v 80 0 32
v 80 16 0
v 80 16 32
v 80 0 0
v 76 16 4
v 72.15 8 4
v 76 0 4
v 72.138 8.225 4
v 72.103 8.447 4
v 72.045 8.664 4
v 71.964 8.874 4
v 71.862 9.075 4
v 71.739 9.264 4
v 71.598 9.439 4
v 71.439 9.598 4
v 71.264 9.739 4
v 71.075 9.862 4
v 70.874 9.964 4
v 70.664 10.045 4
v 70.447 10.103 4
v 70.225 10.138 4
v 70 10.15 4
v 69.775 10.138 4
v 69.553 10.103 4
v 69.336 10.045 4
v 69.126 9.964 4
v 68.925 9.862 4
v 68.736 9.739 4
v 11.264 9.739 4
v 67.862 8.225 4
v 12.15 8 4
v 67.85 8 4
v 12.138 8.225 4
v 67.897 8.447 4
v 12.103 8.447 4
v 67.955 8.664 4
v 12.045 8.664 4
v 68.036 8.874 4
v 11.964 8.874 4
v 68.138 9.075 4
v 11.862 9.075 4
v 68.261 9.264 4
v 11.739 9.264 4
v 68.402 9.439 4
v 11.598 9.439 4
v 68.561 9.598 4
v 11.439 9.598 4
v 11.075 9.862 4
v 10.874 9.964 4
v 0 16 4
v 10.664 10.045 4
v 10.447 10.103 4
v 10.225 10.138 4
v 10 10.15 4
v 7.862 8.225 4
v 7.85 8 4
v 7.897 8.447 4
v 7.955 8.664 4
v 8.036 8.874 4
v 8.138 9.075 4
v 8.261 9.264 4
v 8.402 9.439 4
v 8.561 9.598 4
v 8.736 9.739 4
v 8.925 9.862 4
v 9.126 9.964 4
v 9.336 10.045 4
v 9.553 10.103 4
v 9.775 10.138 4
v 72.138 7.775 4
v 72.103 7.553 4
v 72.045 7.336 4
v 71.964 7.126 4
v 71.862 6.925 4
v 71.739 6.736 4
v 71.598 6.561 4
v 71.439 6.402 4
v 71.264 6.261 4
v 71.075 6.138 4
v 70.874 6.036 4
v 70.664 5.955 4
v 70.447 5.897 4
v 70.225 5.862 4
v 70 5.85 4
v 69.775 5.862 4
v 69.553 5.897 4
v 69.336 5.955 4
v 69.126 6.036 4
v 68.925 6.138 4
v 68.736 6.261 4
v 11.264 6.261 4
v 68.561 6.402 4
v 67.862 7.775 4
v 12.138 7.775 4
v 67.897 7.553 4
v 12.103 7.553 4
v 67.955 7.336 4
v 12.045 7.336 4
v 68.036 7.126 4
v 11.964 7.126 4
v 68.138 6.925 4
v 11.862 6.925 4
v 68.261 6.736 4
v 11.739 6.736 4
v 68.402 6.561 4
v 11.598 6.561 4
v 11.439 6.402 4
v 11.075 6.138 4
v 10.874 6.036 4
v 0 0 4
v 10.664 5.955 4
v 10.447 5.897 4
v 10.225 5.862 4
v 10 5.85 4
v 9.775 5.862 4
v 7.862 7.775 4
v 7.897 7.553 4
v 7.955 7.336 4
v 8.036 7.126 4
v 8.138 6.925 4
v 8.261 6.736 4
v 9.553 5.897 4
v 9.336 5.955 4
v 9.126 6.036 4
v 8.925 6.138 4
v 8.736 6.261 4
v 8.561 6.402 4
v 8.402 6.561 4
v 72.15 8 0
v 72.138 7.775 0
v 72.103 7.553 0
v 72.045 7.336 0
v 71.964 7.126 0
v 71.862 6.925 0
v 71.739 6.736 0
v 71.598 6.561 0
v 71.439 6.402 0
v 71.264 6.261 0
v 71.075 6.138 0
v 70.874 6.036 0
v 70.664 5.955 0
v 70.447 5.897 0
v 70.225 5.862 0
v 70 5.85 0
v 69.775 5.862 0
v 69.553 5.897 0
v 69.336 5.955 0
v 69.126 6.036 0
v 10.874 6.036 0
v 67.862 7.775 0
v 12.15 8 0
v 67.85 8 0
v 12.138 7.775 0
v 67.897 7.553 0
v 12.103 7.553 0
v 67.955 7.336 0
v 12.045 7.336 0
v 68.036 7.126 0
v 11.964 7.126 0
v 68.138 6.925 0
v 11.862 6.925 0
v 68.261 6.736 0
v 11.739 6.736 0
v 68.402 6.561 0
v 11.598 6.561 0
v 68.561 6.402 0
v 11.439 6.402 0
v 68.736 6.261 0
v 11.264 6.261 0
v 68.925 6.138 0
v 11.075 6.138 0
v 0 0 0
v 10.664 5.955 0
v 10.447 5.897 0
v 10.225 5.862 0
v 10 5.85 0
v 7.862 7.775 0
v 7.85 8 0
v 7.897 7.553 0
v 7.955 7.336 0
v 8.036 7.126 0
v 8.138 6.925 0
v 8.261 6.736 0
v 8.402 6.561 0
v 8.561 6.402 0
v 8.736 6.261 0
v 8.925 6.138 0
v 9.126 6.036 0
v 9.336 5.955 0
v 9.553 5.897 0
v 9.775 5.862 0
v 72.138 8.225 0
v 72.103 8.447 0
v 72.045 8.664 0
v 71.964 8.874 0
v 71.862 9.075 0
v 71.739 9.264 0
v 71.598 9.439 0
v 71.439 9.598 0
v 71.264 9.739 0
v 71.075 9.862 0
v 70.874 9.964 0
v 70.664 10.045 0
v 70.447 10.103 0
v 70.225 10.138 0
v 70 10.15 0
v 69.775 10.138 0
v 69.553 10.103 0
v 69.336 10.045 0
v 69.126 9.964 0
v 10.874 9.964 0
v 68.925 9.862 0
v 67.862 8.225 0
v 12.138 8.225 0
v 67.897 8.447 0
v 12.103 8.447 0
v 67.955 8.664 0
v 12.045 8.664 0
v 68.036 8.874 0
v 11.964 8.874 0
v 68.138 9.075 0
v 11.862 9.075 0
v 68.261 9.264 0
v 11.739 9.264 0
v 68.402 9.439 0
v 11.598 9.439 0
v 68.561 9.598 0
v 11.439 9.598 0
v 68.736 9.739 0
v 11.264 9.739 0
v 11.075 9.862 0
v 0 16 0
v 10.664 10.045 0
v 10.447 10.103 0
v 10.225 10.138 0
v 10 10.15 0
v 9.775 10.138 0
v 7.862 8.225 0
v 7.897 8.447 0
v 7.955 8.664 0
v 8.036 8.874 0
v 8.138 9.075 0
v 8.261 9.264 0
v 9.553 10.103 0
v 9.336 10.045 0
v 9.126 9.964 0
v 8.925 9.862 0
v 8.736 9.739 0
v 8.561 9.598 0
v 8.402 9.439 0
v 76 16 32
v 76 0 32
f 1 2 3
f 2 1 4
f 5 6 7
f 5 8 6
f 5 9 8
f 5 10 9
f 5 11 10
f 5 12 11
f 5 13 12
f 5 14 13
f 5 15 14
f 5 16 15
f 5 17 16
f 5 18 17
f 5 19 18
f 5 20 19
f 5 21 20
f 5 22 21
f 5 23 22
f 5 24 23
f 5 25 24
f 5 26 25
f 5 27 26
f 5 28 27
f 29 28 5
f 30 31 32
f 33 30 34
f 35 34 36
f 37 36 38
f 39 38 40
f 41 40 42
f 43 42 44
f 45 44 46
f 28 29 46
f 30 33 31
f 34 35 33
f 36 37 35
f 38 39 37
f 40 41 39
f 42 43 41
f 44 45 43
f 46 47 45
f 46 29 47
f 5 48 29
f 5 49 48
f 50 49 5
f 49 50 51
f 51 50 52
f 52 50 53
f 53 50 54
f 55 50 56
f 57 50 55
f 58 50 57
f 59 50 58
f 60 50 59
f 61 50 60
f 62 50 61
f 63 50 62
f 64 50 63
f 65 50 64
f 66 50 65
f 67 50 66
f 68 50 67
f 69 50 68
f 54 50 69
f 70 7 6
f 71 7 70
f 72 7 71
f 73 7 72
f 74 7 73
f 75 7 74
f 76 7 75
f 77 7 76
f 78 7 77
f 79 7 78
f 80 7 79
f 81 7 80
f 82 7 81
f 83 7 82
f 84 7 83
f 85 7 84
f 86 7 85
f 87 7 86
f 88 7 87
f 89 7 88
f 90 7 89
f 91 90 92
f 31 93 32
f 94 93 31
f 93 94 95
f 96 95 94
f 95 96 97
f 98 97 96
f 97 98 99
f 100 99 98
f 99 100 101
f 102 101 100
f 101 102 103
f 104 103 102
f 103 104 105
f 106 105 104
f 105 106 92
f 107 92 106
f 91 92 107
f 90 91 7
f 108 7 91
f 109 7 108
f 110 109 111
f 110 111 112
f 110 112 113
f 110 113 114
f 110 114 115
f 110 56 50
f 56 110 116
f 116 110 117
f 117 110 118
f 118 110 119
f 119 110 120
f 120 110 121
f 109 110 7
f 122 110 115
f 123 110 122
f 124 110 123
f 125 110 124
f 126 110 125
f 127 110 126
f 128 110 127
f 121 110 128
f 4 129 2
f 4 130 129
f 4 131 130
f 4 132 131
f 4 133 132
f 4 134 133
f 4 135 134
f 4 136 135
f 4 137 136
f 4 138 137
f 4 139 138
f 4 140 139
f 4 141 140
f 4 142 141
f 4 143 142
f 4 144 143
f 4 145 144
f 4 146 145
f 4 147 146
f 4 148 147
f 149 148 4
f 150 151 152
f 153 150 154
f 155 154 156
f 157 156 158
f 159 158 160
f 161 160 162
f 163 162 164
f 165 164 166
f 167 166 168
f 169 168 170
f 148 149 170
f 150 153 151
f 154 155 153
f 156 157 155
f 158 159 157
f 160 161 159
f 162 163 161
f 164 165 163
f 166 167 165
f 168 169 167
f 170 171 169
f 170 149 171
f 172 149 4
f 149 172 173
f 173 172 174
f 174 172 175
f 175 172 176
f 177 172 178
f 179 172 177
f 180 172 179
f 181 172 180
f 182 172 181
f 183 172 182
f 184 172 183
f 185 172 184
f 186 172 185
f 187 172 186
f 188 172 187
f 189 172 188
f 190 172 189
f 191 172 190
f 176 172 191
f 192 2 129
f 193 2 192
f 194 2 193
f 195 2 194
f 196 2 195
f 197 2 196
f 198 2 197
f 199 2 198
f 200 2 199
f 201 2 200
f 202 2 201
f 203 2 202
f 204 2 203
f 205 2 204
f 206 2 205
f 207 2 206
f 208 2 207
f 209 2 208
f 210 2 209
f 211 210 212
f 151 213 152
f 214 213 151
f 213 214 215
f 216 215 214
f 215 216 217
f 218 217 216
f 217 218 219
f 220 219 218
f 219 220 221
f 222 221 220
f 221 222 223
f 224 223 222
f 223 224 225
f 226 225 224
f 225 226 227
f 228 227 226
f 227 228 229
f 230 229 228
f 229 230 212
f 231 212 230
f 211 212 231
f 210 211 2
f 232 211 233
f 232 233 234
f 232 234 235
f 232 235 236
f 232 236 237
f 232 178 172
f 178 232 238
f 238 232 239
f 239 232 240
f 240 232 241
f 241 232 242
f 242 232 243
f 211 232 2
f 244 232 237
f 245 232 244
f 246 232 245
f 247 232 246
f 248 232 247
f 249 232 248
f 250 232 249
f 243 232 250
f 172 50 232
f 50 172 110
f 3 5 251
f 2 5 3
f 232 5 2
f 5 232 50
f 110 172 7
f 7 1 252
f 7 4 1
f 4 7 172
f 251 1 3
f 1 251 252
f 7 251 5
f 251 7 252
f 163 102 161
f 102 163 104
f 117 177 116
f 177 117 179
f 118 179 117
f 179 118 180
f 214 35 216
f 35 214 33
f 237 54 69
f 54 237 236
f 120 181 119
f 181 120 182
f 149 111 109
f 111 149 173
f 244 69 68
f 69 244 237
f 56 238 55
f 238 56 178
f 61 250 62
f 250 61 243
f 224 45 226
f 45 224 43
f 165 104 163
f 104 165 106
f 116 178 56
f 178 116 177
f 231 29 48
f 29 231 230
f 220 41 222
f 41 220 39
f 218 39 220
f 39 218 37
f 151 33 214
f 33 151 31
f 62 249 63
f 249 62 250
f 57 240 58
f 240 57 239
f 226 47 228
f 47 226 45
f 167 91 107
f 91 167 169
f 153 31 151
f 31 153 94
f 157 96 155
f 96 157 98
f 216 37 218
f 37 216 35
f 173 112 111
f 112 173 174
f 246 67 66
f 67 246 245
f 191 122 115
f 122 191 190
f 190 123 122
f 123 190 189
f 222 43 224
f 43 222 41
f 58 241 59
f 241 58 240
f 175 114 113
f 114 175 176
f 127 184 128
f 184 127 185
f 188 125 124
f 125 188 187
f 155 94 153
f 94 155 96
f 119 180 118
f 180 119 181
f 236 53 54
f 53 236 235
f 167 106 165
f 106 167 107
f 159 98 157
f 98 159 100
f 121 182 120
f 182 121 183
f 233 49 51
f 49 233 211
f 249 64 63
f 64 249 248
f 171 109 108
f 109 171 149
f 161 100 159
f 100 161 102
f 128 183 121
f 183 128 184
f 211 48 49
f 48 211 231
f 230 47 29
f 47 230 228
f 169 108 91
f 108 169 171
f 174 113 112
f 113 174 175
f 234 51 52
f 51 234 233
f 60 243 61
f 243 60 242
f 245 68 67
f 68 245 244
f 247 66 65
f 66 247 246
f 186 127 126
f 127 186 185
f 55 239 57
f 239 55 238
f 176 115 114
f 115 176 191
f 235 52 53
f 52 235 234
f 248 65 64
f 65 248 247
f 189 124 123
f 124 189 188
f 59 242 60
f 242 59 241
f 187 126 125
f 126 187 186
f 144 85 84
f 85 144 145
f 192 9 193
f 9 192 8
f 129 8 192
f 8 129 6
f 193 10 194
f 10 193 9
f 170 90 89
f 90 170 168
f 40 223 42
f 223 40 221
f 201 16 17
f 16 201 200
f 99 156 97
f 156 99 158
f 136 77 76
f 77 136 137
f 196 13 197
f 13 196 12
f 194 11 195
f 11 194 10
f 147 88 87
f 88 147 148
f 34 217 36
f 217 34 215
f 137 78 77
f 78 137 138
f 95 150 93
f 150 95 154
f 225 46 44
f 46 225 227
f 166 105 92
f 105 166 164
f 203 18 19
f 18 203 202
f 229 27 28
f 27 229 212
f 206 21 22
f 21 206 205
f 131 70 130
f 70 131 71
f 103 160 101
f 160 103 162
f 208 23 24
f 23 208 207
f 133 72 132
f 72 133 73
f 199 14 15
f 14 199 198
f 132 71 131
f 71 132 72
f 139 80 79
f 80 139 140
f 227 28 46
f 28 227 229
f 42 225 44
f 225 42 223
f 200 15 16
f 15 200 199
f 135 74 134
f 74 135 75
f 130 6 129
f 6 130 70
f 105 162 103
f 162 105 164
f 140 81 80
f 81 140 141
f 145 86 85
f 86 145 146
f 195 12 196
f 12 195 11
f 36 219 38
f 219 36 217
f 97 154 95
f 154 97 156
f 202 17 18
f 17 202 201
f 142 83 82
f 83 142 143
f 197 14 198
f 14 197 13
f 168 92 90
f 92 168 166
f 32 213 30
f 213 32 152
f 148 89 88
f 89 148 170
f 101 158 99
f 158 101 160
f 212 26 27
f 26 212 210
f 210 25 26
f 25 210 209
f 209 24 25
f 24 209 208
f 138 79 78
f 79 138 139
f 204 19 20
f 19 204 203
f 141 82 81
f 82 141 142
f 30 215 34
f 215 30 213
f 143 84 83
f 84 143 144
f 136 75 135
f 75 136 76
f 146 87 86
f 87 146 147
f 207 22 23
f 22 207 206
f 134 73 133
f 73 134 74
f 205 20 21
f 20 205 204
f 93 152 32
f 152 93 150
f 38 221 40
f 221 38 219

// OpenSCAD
// Latch hook bracket.
$fn = 60;
eps = 0.02;
length = 80;
height = 28;
width = 16;
thickness = 4;
difference() { union() { cube([length,width,thickness]); translate([length-thickness,0,thickness]) cube([thickness,width,height]); } for(x=[10,length-10]) translate([x,width/2,-eps]) cylinder(d=4.3,h=thickness+2*eps); }
